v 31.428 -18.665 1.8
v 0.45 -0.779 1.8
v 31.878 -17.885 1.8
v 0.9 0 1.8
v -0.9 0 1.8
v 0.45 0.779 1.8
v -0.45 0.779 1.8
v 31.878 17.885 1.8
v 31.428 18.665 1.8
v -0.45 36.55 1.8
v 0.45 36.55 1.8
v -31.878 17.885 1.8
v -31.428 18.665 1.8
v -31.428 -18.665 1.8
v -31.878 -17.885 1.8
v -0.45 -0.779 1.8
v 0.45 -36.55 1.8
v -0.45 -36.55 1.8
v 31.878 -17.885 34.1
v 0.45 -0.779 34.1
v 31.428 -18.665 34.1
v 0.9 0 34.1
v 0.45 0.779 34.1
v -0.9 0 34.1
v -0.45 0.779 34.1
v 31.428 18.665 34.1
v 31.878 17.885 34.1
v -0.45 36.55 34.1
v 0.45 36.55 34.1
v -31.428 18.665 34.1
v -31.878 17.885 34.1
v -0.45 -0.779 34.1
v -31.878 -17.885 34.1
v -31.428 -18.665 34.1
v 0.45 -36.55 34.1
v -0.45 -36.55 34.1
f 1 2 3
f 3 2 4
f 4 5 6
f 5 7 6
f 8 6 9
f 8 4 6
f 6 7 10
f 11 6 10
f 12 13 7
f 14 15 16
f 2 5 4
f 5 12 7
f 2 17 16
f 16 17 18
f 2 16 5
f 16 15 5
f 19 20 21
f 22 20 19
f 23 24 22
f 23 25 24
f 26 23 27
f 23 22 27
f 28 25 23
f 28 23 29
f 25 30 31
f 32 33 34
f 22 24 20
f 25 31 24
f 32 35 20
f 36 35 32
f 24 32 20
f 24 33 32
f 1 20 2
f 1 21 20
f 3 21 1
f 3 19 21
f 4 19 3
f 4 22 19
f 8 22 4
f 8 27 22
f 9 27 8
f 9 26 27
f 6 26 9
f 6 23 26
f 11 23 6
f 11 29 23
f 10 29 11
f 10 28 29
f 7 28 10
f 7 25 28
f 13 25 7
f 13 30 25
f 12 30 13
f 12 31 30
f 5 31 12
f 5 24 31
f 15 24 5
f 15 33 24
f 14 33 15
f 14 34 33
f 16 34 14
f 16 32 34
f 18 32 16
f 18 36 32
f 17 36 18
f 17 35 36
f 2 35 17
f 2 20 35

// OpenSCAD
// file: ../../Functions/is.scad
/**
 * Diversas funciones para detectar el tipo de datos de un valor.
 *
 * @author  Joaquín Fernández
 * @license CC-BY-NC-4.0
 * @url     https://gitlab.com/joaquinfq/openscad/blob/master/Functions/is.scad
 */

 /**
 * Verifica si el valor es un array
 *
 * @param value Valor a verificar.
 *
 * @return `true` si el valor es un array.
 */
function isArray(x) = len(x) != undef && !isString(x);

/**
 * Verifica si el valor es un booleano
 *
 * @param value Valor a verificar.
 *
 * @return `true` si el valor es un booleano.
 */
function isBool(x) = !isString(x) && (str(x) == "true" || str(x) == "false");

/**
 * Verifica si el valor es un texto
 *
 * @param value Valor a verificar.
 *
 * @return `true` si el valor es un texto.
 */
function isString(x) = x != undef && len(x) != undef && len(str(x,x)) == len(x) * 2;
// file: ../../Functions/Math/trigonometry.scad
/**
 * Diversas funciones trigonométricas.
 *
 * @author  Joaquín Fernández
 * @url     https://gitlab.com/joaquinfq/openscad/blob/master/Functions/Math/trigonometry.scad
 * @license CC-BY-NC-4.0
 */

/**
 * Devuelve el valor del lado de un triángulo aplicando la ley de los cosenos.
 *
 * @param {Float} sideA Lado A del triángulo.
 * @param {Float} sideB Lado B del triángulo.
 * @param {Float} angle Ángulo que forman el lado A y el lado B.
 *
 * @return {Float}
 */
function lawOfCosines(sideA, sideB, angle) = sqrt(
    pow(sideA, 2) + pow(sideB, 2) - 2 * sideA * sideB * cos(angle)
);

/**
 * Calcula el valor del lado de un triángulo a partir de 2 ángulos y
 * 1 lado usando la ley de los senos:
 *
 *   sideA    sideB
 *   -----  = -----
 *   angleA   angleB
 *
 * @param {Float} sideA  Lado A del triángulo.
 * @param {Float} angleA Ángulo opuesto al lado A.
 * @param {Float} angleB Ángulo opuesto al lado B que se quiere calcular.
 *
 * @return {Float}
 */
function saa(sideA, angleA, angleB) = sideA * sin(angleB) / sin(angleA);

/**
 * Calcula el valor del lado de un triángulo a partir de 1 ángulo y
 * 2 lados usando la ley de los senos:
 *
 *   sideA    sideB
 *   -----  = -----
 *   angleA   angleB
 *
 * @param {Float} sideA  Lado A del triángulo.
 * @param {Float} sideB  Lado B del triángulo.
 * @param {Float} angleA Ángulo opuesto al lado A.
 *
 * @return {Float}
 */
function ssa(sideA, sideB, angleA) = asin(sideB * sin(angleA) / sideA);

/**
 * Calcula el valor de un cateto a partir de la hipotenusa y el otro cateto
 * usando el teormea de Pitágoras.
 *
 * @param {Float} hyp  Valor de la hipotenusa.
 * @param {Float} side Lado del triángulo.
 *
 * @return {Float}
 */
function pythagoras(hyp, side) = sqrt(pow(hyp, 2) - pow(side, 2));
// file: ../../Modules/Shapes/rectangular.scad
/**
 * Repite una forma 2D generando un patrón rectangular centrado.
 *
 * @param {Float} side      Tamaño de cada lado del hijo usado como patrón.
 * @param {Float} width     Ancho de cada elemento (eje circular).
 * @param {Float} height    Altura de cada elemento (eje radial).
 * @param {Float} thickness Grosor de las paredes del patrón.
 * @param {Float} sideY     Permite especificar la otra dimensión cuando el área es rectangular.
 *
 * @author  Joaquín Fernández
 * @url     https://gitlab.com/joaquinfq/openscad/blob/master/Modules/Shapes/rectangular.scad
 * @license CC-BY-NC-4.0
 */
module rectangular(side, width, height, thickness, sideY = 0)
{
    _h      = height + thickness;
    _w      = width  + thickness;
    _sx     = side;
    _sy     = sideY ? sideY : side;
    _countX = ceil(_sx / _w);
    _countY = ceil(_sy / _h);
    translate([ - (_countX * _w - _w) / 2, - (_countY * _h - _h) / 2 ])
    {
        for (_x = [ 0 : _w : _sx ])
        {
            for (_y = [ 0 : _h : _sy ])
            {
                translate([ _x, _y ])
                {
                    children();
                }
            }
        }
    }
}
// file: ../../Modules/Shapes/concentric.scad
/**
 * Repite una forma 2D generando un patrón concéntrico centrado.
 *
 * @param {Float} diameter  Diámetro del patrón a generar (eje radial).
 * @param {Float} width     Ancho de cada elemento (eje circular).
 * @param {Float} height    Altura de cada elemento (eje radial).
 * @param {Float} thickness Grosor de las paredes del patrón.
 * @param {Float} from      Valor inicial del radio donde se va a empezar (eje radial).
 *
 * @author  Joaquín Fernández
 * @url     https://gitlab.com/joaquinfq/openscad/blob/master/Modules/Shapes/concentric.scad
 * @license CC-BY-NC-4.0
 */
module concentric(diameter, width, height, thickness, from = 0)
{
    _dc = width  + thickness;
    _dr = height + thickness;
    for (_x = [ from : _dr : (diameter - _dr) / 2 ])
    {
        _l = 2 * PI * _x;
        _a = 360 / floor(_l / _dc);
        for (_b = [ 0 : _a : 360 ])
        {
            rotate(_b)
            {
                translate([ _x, 0 ])
                {
                    rotate(-_b)
                    {
                        children();
                    }
                }
            }
        }
    }
}
// file: ../../Modules/Cylinder/arc.scad
/**
 * Módulos para trabajar con arcos.
 *
 * @author  Joaquín Fernández
 * @url     https://gitlab.com/joaquinfq/openscad/blob/master/Modules/Cylinder/arc.scad
 * @license CC-BY-NC-4.0
 * @see     https://www.thingiverse.com/thing:3353054
 */
//-----------------------------------------------------------------------------
/**
 * Devuelve el listado de puntos necesarios para unir mediante un arco los
 * ángulos inicial y final.
 *
 * @param {Float} from   Ángulo inicial.
 * @param {Float} to     Ángulo final.
 * @param {Float} radius Radio del arco.
 *
 * @return {Float[][]}
 */
function arcPoints(from = 0, to = 360, radius = 1) = let(_step = (to - from) / ($fn ? $fn : 10)) [
    for(_angle = [ from : _step : to + _step / 10 ]) [ cos(_angle), sin(_angle) ] * radius
];
/**
 * Dibuja un arco entre dos ángulos.
 *
 * @param {Float} from      Ángulo inicial.
 * @param {Float} to        Ángulo final.
 * @param {Float} radius    Radio del arco.
 * @param {Float} thickness Grosor del arco.
 */
module arc(from = 0, to = 360, radius = 1, thickness = 0.1)
{
    _outer = radius + thickness / 2;
    _inner = radius - thickness / 2;
    polygon(
        points = concat(
            arcPoints(from, to,   _outer),
            arcPoints(to,   from, _inner)
        )
    );
}
/**
 * Dibuja un conjunto de arcos concéntricos entre dos radios.
 *
 * @param {Float}   from      Radio inicial.
 * @param {Float}   to        Radio final.
 * @param {Float}   thickness Grosor de cada arco.
 * @param {Float[]} angles    Valor de los ángulos inicial y final de cada arco.
 * @param {Float}   delta     Valor para el incremento del radio.
 *                            Si no se especifica se usa el mismo valor que el radio inicial.
 */
module arcs(from, to, thickness = 0.1, angles = [ 0, 360 ], delta = 0)
{
    if (from > 0)
    {
        for (_radius = [ from : delta ? delta : from : to ])
        {
            arc(angles[0], angles[1], _radius, thickness);
        }
    }
}
// file: ../../Modules/Box/rounded.scad
/**
 * Módulos para dibujar cajas con bordes redondeados.
 *
 * @author  Joaquín Fernández
 * @url     https://gitlab.com/joaquinfq/openscad/blob/master/Modules/Box/rounded.scad
 * @license CC-BY-NC-4.0
 */
 //----------------------------------------------------------
 use <../../Functions/is.scad>
 //----------------------------------------------------------
/**
 * Genera las coordenadas para dibujar un rectángulo con las esquinas redondeadas.
 * Cada esquina puede tener un radio diferente.
 *
 * @param {Float}   width  Ancho del rectángulo.
 * @param {Float}   height Alto del rectángulo.
 * @param {Float[]} radius Radios a usar para redondear cada esquina.
 */
function boxRoundedRect(width, height, radius = [ 1, 1, 1, 1 ]) = let(
        _r = radius[0] == undef
            ? [ radius, radius, radius, radius ]
            : radius
    )
    [
        [
            [             0, height - _r[0] ],
            [         _r[0], height - _r[0] ],
            [         _r[0], height         ],
            [ width - _r[1], height         ],
            [ width - _r[1], height - _r[1] ],
            [ width        , height - _r[1] ],
            [ width        ,          _r[2] ],
            [ width - _r[2],          _r[2] ],
            [ width - _r[2],              0 ],
            [         _r[3],              0 ],
            [         _r[3],          _r[3] ],
            [             0,          _r[3] ]
        ],
        [
            [         _r[0], height - _r[0] ],
            [ width - _r[1], height - _r[1] ],
            [ width - _r[2],          _r[2] ],
            [         _r[3],          _r[3] ]
        ]
    ];
//----------------------------------------------------------
/**
 * Dibuja un bloque con los bordes XY redondeados.
 *
 * @param {Float}         width  Ancho del bloque (eje X).
 * @param {Float}         height Largo del bloque (eje Y).
 * @param {Float}         length Alto del bloque (eje Z).
 * @param {Float|Float[]} radius Radios del borde de cada esquina.
 */
module boxRounded(width, height, length, radius = [ 1, 1, 1, 1 ])
{
    if (radius)
    {
        translate([ - width / 2, - height / 2, - length / 2 ])
        {
            linear_extrude(length)
            {
                boxRounded2d(width, height, radius);
            }
        }
    }
    else
    {
        cube([ width, height, length ], center = true);
    }
}
//----------------------------------------------------------
/**
 * Dibuja un bloque con los bordes XY redondeados.
 *
 * @param {Float}         width  Ancho del bloque (eje X).
 * @param {Float}         height Largo del bloque (eje Y).
 * @param {Float|Float[]} radius Radios del borde de cada esquina.
 */
module boxRounded2d(width, height, radius = [ 1, 1, 1, 1 ])
{
    // Si se pasa un número, lo convertimos a un array.
    _radius = isArray(radius)
        ? radius
        : [ radius, radius, radius, radius ];
    _data = boxRoundedRect(width, height, _radius);
    polygon(points = _data[0]);
    for (_index = [ 0 : 3 ])
    {
        if (_radius[_index] > 0)
        {
            translate(_data[1][_index])
            {
                circle(r = _radius[_index]);
            }
        }
    }
}
//----------------------------------------------------------
/**
 * Dibuja un bloque con todos los bordes redondeados.
 *
 * @param width  Ancho del bloque (eje X).
 * @param height Largo del bloque (eje Y).
 * @param length Alto del bloque (eje Z).
 * @param radius Radio del borde.
 */
module boxRounded3d(width, height, length, radius = 1)
{
    if (radius > 0)
    {
        hull()
        {
            for (z = [ -1, 1 ])
            {
                for (y = [ -1, 1 ])
                {
                    for (x = [ -1, 1 ])
                    {
                        translate([
                            x * (width  / 2 - radius),
                            y * (height / 2 - radius),
                            z * (length / 2 - radius)
                        ])
                        {
                            sphere(r = radius, center = true);
                        }
                    }
                }
            }
        }
    }
    else
    {
        cube([ width, height, length ], center = true);
    }
}
// file: ../../Functions/Math/line.scad
/**
 * Diversas funciones para trabajar con ecuaciones de la recta.
 *
 * @author  Joaquín Fernández
 * @url     https://gitlab.com/joaquinfq/openscad/blob/master/Functions/Math/line.scad
 * @license CC-BY-NC-4.0
 */
//-----------------------------------------------------------------------------
use <./trigonometry.scad>
//-----------------------------------------------------------------------------
/**
 * Dadas dos líneas que se cortan, devuelve la bisectriz.
 *
 * @param {Float[]} line1 Especificación de la línea 1 (0: pendiente, 1: coeficiente b).
 * @param {Float[]} line2 Especificación de la línea 2 (0: pendiente, 1: coeficiente b).
 *
 * @return {Float[]|undef}
 */
function bisectrix(line1, line2) = let(
        r1 = [ line1[0], line1[1], 1 ] * norm([ line2[0], 1 ]),
        r2 = [ line2[0], line2[1], 1 ] * norm([ line1[0], 1 ])
    ) r1[2] == r2[2]
        ? undef
        : [ r1[0] - r2[0], r1[1] - r2[1] ] / (r1[2] - r2[2]);

/**
 * Devuelve el ángulo entre las líneas formadas por los puntos especificados.
 *
 * @param {Float[]} point1 Punto de una recta en formato [ x, y ].
 * @param {Float[]} point2 Punto de la otra recta en formato [ x, y ].
 * @param {Float[]} common Punto común a las 2 rectas en formato [ x, y ].
 *
 * @return {Float}
 */
function getAngle(point1, point2, common) = let(
        eq1 = getEq(point1, common),
        eq2 = getEq(point2, common)
    )
    // atan((eq2[0] - eq1[0]) / (1 + eq2[0] * eq1[0]))
    acos((eq1[0] * eq2[0] + 1) / (norm([ eq1[0], 1 ]) * norm([ eq2[0], 1 ])));

/**
 * Devuelve la ecuación de la recta que pasa por los puntos especificados.
 *
 * @param {Float[]} point1 Punto 1 de la recta en formato [ x, y ].
 * @param {Float[]} point2 Punto 2 de la recta en formato [ x, y ].
 *
 * @return {Float[]} Ecuación en formato [ m, b ].
 */
function getEq(point1, point2) = let(m = slope(point1, point2)) [ m, point1[1] - m * point1[0] ];

/**
 * Devuelve la pendiente de la recta que pasa por los puntos especificados.
 *
 * @param {Float[]} point1 Punto 1 de la recta en formato [ x, y ].
 * @param {Float[]} point2 Punto 2 de la recta en formato [ x, y ].
 *
 * @return {Float}
 */
function slope(point1, point2) = (point2[1] - point1[1]) / (point2[0] - point1[0]);

/**
 * Dados 3 puntos de 2 rectas secantes, devuelve los puntos necesarios para realizar un empalme
 * así como el ángulo formado por ambas líneas.
 *
 * @param {Float[]} point1 Punto de una recta en formato [ x, y ].
 * @param {Float[]} point2 Punto de la otra recta en formato [ x, y ].
 * @param {Float[]} common Punto común a las 2 rectas en formato [ x, y ].
 * @param {Float}   radius Radio del empalme.
 *
 * @return {Float[]}
 */
function splice(point1, point2, common, radius) = let(
    x      = common[0],
    y      = common[1],
    eq1    = getEq(point1, common),
    eq2    = getEq(point2, common),
    angle  = getAngle(point1, point2, common),
    bis    = bisectrix(eq1, eq2),
    center = [ ((y - radius) - bis[1]) / bis[0], y - radius ],
    side   = pythagoras(norm([ x - center[0], y - center[1] ]), radius),
    x1     = x - side * cos(angle)
) [
    angle,
    [ x1, eq1[0] * x1 + eq1[1] ],
    center,
    [ x + side, y ]
];
// file: constants.scad
/**
 * Constantes usadas por los módulos y que no deberían tocarse salvo que se
 * sepa lo que se está haciendo.
 *
 * @author  Joaquín Fernández
 * @url     https://gitlab.com/joaquinfq/openscad/blob/master/Storage/Pringles/constants.scad
 * @license CC-BY-NC-4.0
 * @see     https://www.thingiverse.com/thing:3612377
 */
INNER      = 73;   // Diámetro interior del cilindro.
OUTER      = 77.7; // Diámetro exterior del cilindro.
LENGTH     = 35;   // Altura por defecto del cilindro.
THICKNESS  = 0.9;  // Grosor de las paredes del cilindro.
LID_HEIGHT = 6.6;  // Altura de la tapa plástica.
RADIUS     = 1.2;  // Radio del anillo de ajuste de la tapa
OFFSET     = 1.5;  // Distancia del borde al centro del anillo.

function getConstants() = [ INNER, OUTER, LENGTH, THICKNESS, LID_HEIGHT, RADIUS, OFFSET ];
// file: ../../Modules/Shapes/propeller.scad
/**
 * Dibuja las palas de una hélice recta.
 *
 * @param diameter  Diámetro de la hélice.
 * @param height    Altura de las palas.
 * @param thickness Grosor de las paredes de las palas.
 * @param angles    Ángulos de las palas.
 *
 * @author  Joaquín Fernández
 * @url     https://gitlab.com/joaquinfq/openscad/blob/master/Modules/Shapes/propeller.scad
 * @license CC-BY-NC-4.0
 */
module propeller(diameter, height, thickness = 1.2, angles = [ 0, 60, 120, 180, 240, 300 ])
{
    linear_extrude(height)
    {
        // Dibujamos las palas
        for (angle = angles)
        {
            rotate(angle)
            {
                translate([ - thickness / 2, 0 ])
                {
                    square([ thickness, diameter / 2 ]);
                }
            }
        }
        // Redondeado de la unión.
        circle(d = thickness);
    }
}
// main file
/**
 * Genera un contenedor dividido en segmentos radiales.
 *
 * @author  Joaquín Fernández
 * @url     https://gitlab.com/joaquinfq/openscad/blob/master/Storage/Pringles/segments.scad
 * @license CC-BY-NC-4.0
 * @see     https://www.thingiverse.com/thing:3612377
 */
//---------------------------------------------------------------
use <../../Modules/Shapes/propeller.scad>
use <./constants.scad>
use <./container.scad>
//---------------------------------------------------------------
constants  = getConstants();
INNER      = constants[0];
LENGTH     = constants[2];
THICKNESS  = constants[3];

/**
 * Divide el contenedor en segmentos radiales.
 *
 * @param {Float} count     Cantidad de segmentos.
 * @param {Float} length    Longitud del contenedor (eje Z).
 * @param {Float} plength   Longitud del patrón (eje Z).
 * @param {Float} thickness Grosor de las paredes del segmento.
 */
module segments(count = 4, length = LENGTH, plength = LENGTH -  3 * THICKNESS, thickness = THICKNESS)
{
    _text = str(length, "-", plength, "x", count, ".stl");
    container(length)
    {
        if ($children)
        {
            echo(str("Pringle-segments-custom-", _text));
            difference()
            {
                children();
                propeller(INNER + 0.1, plength, thickness, [ 0 : 360 / count : 359 ]);
            }
        }
        else
        {
            echo(str("Pringle-segments-", _text));
            propeller(INNER + 0.1, plength, thickness, [ 0 : 360 / count : 359 ]);
        }
    }
}

//-----------------------------------------------------------------------------
segments(6);
